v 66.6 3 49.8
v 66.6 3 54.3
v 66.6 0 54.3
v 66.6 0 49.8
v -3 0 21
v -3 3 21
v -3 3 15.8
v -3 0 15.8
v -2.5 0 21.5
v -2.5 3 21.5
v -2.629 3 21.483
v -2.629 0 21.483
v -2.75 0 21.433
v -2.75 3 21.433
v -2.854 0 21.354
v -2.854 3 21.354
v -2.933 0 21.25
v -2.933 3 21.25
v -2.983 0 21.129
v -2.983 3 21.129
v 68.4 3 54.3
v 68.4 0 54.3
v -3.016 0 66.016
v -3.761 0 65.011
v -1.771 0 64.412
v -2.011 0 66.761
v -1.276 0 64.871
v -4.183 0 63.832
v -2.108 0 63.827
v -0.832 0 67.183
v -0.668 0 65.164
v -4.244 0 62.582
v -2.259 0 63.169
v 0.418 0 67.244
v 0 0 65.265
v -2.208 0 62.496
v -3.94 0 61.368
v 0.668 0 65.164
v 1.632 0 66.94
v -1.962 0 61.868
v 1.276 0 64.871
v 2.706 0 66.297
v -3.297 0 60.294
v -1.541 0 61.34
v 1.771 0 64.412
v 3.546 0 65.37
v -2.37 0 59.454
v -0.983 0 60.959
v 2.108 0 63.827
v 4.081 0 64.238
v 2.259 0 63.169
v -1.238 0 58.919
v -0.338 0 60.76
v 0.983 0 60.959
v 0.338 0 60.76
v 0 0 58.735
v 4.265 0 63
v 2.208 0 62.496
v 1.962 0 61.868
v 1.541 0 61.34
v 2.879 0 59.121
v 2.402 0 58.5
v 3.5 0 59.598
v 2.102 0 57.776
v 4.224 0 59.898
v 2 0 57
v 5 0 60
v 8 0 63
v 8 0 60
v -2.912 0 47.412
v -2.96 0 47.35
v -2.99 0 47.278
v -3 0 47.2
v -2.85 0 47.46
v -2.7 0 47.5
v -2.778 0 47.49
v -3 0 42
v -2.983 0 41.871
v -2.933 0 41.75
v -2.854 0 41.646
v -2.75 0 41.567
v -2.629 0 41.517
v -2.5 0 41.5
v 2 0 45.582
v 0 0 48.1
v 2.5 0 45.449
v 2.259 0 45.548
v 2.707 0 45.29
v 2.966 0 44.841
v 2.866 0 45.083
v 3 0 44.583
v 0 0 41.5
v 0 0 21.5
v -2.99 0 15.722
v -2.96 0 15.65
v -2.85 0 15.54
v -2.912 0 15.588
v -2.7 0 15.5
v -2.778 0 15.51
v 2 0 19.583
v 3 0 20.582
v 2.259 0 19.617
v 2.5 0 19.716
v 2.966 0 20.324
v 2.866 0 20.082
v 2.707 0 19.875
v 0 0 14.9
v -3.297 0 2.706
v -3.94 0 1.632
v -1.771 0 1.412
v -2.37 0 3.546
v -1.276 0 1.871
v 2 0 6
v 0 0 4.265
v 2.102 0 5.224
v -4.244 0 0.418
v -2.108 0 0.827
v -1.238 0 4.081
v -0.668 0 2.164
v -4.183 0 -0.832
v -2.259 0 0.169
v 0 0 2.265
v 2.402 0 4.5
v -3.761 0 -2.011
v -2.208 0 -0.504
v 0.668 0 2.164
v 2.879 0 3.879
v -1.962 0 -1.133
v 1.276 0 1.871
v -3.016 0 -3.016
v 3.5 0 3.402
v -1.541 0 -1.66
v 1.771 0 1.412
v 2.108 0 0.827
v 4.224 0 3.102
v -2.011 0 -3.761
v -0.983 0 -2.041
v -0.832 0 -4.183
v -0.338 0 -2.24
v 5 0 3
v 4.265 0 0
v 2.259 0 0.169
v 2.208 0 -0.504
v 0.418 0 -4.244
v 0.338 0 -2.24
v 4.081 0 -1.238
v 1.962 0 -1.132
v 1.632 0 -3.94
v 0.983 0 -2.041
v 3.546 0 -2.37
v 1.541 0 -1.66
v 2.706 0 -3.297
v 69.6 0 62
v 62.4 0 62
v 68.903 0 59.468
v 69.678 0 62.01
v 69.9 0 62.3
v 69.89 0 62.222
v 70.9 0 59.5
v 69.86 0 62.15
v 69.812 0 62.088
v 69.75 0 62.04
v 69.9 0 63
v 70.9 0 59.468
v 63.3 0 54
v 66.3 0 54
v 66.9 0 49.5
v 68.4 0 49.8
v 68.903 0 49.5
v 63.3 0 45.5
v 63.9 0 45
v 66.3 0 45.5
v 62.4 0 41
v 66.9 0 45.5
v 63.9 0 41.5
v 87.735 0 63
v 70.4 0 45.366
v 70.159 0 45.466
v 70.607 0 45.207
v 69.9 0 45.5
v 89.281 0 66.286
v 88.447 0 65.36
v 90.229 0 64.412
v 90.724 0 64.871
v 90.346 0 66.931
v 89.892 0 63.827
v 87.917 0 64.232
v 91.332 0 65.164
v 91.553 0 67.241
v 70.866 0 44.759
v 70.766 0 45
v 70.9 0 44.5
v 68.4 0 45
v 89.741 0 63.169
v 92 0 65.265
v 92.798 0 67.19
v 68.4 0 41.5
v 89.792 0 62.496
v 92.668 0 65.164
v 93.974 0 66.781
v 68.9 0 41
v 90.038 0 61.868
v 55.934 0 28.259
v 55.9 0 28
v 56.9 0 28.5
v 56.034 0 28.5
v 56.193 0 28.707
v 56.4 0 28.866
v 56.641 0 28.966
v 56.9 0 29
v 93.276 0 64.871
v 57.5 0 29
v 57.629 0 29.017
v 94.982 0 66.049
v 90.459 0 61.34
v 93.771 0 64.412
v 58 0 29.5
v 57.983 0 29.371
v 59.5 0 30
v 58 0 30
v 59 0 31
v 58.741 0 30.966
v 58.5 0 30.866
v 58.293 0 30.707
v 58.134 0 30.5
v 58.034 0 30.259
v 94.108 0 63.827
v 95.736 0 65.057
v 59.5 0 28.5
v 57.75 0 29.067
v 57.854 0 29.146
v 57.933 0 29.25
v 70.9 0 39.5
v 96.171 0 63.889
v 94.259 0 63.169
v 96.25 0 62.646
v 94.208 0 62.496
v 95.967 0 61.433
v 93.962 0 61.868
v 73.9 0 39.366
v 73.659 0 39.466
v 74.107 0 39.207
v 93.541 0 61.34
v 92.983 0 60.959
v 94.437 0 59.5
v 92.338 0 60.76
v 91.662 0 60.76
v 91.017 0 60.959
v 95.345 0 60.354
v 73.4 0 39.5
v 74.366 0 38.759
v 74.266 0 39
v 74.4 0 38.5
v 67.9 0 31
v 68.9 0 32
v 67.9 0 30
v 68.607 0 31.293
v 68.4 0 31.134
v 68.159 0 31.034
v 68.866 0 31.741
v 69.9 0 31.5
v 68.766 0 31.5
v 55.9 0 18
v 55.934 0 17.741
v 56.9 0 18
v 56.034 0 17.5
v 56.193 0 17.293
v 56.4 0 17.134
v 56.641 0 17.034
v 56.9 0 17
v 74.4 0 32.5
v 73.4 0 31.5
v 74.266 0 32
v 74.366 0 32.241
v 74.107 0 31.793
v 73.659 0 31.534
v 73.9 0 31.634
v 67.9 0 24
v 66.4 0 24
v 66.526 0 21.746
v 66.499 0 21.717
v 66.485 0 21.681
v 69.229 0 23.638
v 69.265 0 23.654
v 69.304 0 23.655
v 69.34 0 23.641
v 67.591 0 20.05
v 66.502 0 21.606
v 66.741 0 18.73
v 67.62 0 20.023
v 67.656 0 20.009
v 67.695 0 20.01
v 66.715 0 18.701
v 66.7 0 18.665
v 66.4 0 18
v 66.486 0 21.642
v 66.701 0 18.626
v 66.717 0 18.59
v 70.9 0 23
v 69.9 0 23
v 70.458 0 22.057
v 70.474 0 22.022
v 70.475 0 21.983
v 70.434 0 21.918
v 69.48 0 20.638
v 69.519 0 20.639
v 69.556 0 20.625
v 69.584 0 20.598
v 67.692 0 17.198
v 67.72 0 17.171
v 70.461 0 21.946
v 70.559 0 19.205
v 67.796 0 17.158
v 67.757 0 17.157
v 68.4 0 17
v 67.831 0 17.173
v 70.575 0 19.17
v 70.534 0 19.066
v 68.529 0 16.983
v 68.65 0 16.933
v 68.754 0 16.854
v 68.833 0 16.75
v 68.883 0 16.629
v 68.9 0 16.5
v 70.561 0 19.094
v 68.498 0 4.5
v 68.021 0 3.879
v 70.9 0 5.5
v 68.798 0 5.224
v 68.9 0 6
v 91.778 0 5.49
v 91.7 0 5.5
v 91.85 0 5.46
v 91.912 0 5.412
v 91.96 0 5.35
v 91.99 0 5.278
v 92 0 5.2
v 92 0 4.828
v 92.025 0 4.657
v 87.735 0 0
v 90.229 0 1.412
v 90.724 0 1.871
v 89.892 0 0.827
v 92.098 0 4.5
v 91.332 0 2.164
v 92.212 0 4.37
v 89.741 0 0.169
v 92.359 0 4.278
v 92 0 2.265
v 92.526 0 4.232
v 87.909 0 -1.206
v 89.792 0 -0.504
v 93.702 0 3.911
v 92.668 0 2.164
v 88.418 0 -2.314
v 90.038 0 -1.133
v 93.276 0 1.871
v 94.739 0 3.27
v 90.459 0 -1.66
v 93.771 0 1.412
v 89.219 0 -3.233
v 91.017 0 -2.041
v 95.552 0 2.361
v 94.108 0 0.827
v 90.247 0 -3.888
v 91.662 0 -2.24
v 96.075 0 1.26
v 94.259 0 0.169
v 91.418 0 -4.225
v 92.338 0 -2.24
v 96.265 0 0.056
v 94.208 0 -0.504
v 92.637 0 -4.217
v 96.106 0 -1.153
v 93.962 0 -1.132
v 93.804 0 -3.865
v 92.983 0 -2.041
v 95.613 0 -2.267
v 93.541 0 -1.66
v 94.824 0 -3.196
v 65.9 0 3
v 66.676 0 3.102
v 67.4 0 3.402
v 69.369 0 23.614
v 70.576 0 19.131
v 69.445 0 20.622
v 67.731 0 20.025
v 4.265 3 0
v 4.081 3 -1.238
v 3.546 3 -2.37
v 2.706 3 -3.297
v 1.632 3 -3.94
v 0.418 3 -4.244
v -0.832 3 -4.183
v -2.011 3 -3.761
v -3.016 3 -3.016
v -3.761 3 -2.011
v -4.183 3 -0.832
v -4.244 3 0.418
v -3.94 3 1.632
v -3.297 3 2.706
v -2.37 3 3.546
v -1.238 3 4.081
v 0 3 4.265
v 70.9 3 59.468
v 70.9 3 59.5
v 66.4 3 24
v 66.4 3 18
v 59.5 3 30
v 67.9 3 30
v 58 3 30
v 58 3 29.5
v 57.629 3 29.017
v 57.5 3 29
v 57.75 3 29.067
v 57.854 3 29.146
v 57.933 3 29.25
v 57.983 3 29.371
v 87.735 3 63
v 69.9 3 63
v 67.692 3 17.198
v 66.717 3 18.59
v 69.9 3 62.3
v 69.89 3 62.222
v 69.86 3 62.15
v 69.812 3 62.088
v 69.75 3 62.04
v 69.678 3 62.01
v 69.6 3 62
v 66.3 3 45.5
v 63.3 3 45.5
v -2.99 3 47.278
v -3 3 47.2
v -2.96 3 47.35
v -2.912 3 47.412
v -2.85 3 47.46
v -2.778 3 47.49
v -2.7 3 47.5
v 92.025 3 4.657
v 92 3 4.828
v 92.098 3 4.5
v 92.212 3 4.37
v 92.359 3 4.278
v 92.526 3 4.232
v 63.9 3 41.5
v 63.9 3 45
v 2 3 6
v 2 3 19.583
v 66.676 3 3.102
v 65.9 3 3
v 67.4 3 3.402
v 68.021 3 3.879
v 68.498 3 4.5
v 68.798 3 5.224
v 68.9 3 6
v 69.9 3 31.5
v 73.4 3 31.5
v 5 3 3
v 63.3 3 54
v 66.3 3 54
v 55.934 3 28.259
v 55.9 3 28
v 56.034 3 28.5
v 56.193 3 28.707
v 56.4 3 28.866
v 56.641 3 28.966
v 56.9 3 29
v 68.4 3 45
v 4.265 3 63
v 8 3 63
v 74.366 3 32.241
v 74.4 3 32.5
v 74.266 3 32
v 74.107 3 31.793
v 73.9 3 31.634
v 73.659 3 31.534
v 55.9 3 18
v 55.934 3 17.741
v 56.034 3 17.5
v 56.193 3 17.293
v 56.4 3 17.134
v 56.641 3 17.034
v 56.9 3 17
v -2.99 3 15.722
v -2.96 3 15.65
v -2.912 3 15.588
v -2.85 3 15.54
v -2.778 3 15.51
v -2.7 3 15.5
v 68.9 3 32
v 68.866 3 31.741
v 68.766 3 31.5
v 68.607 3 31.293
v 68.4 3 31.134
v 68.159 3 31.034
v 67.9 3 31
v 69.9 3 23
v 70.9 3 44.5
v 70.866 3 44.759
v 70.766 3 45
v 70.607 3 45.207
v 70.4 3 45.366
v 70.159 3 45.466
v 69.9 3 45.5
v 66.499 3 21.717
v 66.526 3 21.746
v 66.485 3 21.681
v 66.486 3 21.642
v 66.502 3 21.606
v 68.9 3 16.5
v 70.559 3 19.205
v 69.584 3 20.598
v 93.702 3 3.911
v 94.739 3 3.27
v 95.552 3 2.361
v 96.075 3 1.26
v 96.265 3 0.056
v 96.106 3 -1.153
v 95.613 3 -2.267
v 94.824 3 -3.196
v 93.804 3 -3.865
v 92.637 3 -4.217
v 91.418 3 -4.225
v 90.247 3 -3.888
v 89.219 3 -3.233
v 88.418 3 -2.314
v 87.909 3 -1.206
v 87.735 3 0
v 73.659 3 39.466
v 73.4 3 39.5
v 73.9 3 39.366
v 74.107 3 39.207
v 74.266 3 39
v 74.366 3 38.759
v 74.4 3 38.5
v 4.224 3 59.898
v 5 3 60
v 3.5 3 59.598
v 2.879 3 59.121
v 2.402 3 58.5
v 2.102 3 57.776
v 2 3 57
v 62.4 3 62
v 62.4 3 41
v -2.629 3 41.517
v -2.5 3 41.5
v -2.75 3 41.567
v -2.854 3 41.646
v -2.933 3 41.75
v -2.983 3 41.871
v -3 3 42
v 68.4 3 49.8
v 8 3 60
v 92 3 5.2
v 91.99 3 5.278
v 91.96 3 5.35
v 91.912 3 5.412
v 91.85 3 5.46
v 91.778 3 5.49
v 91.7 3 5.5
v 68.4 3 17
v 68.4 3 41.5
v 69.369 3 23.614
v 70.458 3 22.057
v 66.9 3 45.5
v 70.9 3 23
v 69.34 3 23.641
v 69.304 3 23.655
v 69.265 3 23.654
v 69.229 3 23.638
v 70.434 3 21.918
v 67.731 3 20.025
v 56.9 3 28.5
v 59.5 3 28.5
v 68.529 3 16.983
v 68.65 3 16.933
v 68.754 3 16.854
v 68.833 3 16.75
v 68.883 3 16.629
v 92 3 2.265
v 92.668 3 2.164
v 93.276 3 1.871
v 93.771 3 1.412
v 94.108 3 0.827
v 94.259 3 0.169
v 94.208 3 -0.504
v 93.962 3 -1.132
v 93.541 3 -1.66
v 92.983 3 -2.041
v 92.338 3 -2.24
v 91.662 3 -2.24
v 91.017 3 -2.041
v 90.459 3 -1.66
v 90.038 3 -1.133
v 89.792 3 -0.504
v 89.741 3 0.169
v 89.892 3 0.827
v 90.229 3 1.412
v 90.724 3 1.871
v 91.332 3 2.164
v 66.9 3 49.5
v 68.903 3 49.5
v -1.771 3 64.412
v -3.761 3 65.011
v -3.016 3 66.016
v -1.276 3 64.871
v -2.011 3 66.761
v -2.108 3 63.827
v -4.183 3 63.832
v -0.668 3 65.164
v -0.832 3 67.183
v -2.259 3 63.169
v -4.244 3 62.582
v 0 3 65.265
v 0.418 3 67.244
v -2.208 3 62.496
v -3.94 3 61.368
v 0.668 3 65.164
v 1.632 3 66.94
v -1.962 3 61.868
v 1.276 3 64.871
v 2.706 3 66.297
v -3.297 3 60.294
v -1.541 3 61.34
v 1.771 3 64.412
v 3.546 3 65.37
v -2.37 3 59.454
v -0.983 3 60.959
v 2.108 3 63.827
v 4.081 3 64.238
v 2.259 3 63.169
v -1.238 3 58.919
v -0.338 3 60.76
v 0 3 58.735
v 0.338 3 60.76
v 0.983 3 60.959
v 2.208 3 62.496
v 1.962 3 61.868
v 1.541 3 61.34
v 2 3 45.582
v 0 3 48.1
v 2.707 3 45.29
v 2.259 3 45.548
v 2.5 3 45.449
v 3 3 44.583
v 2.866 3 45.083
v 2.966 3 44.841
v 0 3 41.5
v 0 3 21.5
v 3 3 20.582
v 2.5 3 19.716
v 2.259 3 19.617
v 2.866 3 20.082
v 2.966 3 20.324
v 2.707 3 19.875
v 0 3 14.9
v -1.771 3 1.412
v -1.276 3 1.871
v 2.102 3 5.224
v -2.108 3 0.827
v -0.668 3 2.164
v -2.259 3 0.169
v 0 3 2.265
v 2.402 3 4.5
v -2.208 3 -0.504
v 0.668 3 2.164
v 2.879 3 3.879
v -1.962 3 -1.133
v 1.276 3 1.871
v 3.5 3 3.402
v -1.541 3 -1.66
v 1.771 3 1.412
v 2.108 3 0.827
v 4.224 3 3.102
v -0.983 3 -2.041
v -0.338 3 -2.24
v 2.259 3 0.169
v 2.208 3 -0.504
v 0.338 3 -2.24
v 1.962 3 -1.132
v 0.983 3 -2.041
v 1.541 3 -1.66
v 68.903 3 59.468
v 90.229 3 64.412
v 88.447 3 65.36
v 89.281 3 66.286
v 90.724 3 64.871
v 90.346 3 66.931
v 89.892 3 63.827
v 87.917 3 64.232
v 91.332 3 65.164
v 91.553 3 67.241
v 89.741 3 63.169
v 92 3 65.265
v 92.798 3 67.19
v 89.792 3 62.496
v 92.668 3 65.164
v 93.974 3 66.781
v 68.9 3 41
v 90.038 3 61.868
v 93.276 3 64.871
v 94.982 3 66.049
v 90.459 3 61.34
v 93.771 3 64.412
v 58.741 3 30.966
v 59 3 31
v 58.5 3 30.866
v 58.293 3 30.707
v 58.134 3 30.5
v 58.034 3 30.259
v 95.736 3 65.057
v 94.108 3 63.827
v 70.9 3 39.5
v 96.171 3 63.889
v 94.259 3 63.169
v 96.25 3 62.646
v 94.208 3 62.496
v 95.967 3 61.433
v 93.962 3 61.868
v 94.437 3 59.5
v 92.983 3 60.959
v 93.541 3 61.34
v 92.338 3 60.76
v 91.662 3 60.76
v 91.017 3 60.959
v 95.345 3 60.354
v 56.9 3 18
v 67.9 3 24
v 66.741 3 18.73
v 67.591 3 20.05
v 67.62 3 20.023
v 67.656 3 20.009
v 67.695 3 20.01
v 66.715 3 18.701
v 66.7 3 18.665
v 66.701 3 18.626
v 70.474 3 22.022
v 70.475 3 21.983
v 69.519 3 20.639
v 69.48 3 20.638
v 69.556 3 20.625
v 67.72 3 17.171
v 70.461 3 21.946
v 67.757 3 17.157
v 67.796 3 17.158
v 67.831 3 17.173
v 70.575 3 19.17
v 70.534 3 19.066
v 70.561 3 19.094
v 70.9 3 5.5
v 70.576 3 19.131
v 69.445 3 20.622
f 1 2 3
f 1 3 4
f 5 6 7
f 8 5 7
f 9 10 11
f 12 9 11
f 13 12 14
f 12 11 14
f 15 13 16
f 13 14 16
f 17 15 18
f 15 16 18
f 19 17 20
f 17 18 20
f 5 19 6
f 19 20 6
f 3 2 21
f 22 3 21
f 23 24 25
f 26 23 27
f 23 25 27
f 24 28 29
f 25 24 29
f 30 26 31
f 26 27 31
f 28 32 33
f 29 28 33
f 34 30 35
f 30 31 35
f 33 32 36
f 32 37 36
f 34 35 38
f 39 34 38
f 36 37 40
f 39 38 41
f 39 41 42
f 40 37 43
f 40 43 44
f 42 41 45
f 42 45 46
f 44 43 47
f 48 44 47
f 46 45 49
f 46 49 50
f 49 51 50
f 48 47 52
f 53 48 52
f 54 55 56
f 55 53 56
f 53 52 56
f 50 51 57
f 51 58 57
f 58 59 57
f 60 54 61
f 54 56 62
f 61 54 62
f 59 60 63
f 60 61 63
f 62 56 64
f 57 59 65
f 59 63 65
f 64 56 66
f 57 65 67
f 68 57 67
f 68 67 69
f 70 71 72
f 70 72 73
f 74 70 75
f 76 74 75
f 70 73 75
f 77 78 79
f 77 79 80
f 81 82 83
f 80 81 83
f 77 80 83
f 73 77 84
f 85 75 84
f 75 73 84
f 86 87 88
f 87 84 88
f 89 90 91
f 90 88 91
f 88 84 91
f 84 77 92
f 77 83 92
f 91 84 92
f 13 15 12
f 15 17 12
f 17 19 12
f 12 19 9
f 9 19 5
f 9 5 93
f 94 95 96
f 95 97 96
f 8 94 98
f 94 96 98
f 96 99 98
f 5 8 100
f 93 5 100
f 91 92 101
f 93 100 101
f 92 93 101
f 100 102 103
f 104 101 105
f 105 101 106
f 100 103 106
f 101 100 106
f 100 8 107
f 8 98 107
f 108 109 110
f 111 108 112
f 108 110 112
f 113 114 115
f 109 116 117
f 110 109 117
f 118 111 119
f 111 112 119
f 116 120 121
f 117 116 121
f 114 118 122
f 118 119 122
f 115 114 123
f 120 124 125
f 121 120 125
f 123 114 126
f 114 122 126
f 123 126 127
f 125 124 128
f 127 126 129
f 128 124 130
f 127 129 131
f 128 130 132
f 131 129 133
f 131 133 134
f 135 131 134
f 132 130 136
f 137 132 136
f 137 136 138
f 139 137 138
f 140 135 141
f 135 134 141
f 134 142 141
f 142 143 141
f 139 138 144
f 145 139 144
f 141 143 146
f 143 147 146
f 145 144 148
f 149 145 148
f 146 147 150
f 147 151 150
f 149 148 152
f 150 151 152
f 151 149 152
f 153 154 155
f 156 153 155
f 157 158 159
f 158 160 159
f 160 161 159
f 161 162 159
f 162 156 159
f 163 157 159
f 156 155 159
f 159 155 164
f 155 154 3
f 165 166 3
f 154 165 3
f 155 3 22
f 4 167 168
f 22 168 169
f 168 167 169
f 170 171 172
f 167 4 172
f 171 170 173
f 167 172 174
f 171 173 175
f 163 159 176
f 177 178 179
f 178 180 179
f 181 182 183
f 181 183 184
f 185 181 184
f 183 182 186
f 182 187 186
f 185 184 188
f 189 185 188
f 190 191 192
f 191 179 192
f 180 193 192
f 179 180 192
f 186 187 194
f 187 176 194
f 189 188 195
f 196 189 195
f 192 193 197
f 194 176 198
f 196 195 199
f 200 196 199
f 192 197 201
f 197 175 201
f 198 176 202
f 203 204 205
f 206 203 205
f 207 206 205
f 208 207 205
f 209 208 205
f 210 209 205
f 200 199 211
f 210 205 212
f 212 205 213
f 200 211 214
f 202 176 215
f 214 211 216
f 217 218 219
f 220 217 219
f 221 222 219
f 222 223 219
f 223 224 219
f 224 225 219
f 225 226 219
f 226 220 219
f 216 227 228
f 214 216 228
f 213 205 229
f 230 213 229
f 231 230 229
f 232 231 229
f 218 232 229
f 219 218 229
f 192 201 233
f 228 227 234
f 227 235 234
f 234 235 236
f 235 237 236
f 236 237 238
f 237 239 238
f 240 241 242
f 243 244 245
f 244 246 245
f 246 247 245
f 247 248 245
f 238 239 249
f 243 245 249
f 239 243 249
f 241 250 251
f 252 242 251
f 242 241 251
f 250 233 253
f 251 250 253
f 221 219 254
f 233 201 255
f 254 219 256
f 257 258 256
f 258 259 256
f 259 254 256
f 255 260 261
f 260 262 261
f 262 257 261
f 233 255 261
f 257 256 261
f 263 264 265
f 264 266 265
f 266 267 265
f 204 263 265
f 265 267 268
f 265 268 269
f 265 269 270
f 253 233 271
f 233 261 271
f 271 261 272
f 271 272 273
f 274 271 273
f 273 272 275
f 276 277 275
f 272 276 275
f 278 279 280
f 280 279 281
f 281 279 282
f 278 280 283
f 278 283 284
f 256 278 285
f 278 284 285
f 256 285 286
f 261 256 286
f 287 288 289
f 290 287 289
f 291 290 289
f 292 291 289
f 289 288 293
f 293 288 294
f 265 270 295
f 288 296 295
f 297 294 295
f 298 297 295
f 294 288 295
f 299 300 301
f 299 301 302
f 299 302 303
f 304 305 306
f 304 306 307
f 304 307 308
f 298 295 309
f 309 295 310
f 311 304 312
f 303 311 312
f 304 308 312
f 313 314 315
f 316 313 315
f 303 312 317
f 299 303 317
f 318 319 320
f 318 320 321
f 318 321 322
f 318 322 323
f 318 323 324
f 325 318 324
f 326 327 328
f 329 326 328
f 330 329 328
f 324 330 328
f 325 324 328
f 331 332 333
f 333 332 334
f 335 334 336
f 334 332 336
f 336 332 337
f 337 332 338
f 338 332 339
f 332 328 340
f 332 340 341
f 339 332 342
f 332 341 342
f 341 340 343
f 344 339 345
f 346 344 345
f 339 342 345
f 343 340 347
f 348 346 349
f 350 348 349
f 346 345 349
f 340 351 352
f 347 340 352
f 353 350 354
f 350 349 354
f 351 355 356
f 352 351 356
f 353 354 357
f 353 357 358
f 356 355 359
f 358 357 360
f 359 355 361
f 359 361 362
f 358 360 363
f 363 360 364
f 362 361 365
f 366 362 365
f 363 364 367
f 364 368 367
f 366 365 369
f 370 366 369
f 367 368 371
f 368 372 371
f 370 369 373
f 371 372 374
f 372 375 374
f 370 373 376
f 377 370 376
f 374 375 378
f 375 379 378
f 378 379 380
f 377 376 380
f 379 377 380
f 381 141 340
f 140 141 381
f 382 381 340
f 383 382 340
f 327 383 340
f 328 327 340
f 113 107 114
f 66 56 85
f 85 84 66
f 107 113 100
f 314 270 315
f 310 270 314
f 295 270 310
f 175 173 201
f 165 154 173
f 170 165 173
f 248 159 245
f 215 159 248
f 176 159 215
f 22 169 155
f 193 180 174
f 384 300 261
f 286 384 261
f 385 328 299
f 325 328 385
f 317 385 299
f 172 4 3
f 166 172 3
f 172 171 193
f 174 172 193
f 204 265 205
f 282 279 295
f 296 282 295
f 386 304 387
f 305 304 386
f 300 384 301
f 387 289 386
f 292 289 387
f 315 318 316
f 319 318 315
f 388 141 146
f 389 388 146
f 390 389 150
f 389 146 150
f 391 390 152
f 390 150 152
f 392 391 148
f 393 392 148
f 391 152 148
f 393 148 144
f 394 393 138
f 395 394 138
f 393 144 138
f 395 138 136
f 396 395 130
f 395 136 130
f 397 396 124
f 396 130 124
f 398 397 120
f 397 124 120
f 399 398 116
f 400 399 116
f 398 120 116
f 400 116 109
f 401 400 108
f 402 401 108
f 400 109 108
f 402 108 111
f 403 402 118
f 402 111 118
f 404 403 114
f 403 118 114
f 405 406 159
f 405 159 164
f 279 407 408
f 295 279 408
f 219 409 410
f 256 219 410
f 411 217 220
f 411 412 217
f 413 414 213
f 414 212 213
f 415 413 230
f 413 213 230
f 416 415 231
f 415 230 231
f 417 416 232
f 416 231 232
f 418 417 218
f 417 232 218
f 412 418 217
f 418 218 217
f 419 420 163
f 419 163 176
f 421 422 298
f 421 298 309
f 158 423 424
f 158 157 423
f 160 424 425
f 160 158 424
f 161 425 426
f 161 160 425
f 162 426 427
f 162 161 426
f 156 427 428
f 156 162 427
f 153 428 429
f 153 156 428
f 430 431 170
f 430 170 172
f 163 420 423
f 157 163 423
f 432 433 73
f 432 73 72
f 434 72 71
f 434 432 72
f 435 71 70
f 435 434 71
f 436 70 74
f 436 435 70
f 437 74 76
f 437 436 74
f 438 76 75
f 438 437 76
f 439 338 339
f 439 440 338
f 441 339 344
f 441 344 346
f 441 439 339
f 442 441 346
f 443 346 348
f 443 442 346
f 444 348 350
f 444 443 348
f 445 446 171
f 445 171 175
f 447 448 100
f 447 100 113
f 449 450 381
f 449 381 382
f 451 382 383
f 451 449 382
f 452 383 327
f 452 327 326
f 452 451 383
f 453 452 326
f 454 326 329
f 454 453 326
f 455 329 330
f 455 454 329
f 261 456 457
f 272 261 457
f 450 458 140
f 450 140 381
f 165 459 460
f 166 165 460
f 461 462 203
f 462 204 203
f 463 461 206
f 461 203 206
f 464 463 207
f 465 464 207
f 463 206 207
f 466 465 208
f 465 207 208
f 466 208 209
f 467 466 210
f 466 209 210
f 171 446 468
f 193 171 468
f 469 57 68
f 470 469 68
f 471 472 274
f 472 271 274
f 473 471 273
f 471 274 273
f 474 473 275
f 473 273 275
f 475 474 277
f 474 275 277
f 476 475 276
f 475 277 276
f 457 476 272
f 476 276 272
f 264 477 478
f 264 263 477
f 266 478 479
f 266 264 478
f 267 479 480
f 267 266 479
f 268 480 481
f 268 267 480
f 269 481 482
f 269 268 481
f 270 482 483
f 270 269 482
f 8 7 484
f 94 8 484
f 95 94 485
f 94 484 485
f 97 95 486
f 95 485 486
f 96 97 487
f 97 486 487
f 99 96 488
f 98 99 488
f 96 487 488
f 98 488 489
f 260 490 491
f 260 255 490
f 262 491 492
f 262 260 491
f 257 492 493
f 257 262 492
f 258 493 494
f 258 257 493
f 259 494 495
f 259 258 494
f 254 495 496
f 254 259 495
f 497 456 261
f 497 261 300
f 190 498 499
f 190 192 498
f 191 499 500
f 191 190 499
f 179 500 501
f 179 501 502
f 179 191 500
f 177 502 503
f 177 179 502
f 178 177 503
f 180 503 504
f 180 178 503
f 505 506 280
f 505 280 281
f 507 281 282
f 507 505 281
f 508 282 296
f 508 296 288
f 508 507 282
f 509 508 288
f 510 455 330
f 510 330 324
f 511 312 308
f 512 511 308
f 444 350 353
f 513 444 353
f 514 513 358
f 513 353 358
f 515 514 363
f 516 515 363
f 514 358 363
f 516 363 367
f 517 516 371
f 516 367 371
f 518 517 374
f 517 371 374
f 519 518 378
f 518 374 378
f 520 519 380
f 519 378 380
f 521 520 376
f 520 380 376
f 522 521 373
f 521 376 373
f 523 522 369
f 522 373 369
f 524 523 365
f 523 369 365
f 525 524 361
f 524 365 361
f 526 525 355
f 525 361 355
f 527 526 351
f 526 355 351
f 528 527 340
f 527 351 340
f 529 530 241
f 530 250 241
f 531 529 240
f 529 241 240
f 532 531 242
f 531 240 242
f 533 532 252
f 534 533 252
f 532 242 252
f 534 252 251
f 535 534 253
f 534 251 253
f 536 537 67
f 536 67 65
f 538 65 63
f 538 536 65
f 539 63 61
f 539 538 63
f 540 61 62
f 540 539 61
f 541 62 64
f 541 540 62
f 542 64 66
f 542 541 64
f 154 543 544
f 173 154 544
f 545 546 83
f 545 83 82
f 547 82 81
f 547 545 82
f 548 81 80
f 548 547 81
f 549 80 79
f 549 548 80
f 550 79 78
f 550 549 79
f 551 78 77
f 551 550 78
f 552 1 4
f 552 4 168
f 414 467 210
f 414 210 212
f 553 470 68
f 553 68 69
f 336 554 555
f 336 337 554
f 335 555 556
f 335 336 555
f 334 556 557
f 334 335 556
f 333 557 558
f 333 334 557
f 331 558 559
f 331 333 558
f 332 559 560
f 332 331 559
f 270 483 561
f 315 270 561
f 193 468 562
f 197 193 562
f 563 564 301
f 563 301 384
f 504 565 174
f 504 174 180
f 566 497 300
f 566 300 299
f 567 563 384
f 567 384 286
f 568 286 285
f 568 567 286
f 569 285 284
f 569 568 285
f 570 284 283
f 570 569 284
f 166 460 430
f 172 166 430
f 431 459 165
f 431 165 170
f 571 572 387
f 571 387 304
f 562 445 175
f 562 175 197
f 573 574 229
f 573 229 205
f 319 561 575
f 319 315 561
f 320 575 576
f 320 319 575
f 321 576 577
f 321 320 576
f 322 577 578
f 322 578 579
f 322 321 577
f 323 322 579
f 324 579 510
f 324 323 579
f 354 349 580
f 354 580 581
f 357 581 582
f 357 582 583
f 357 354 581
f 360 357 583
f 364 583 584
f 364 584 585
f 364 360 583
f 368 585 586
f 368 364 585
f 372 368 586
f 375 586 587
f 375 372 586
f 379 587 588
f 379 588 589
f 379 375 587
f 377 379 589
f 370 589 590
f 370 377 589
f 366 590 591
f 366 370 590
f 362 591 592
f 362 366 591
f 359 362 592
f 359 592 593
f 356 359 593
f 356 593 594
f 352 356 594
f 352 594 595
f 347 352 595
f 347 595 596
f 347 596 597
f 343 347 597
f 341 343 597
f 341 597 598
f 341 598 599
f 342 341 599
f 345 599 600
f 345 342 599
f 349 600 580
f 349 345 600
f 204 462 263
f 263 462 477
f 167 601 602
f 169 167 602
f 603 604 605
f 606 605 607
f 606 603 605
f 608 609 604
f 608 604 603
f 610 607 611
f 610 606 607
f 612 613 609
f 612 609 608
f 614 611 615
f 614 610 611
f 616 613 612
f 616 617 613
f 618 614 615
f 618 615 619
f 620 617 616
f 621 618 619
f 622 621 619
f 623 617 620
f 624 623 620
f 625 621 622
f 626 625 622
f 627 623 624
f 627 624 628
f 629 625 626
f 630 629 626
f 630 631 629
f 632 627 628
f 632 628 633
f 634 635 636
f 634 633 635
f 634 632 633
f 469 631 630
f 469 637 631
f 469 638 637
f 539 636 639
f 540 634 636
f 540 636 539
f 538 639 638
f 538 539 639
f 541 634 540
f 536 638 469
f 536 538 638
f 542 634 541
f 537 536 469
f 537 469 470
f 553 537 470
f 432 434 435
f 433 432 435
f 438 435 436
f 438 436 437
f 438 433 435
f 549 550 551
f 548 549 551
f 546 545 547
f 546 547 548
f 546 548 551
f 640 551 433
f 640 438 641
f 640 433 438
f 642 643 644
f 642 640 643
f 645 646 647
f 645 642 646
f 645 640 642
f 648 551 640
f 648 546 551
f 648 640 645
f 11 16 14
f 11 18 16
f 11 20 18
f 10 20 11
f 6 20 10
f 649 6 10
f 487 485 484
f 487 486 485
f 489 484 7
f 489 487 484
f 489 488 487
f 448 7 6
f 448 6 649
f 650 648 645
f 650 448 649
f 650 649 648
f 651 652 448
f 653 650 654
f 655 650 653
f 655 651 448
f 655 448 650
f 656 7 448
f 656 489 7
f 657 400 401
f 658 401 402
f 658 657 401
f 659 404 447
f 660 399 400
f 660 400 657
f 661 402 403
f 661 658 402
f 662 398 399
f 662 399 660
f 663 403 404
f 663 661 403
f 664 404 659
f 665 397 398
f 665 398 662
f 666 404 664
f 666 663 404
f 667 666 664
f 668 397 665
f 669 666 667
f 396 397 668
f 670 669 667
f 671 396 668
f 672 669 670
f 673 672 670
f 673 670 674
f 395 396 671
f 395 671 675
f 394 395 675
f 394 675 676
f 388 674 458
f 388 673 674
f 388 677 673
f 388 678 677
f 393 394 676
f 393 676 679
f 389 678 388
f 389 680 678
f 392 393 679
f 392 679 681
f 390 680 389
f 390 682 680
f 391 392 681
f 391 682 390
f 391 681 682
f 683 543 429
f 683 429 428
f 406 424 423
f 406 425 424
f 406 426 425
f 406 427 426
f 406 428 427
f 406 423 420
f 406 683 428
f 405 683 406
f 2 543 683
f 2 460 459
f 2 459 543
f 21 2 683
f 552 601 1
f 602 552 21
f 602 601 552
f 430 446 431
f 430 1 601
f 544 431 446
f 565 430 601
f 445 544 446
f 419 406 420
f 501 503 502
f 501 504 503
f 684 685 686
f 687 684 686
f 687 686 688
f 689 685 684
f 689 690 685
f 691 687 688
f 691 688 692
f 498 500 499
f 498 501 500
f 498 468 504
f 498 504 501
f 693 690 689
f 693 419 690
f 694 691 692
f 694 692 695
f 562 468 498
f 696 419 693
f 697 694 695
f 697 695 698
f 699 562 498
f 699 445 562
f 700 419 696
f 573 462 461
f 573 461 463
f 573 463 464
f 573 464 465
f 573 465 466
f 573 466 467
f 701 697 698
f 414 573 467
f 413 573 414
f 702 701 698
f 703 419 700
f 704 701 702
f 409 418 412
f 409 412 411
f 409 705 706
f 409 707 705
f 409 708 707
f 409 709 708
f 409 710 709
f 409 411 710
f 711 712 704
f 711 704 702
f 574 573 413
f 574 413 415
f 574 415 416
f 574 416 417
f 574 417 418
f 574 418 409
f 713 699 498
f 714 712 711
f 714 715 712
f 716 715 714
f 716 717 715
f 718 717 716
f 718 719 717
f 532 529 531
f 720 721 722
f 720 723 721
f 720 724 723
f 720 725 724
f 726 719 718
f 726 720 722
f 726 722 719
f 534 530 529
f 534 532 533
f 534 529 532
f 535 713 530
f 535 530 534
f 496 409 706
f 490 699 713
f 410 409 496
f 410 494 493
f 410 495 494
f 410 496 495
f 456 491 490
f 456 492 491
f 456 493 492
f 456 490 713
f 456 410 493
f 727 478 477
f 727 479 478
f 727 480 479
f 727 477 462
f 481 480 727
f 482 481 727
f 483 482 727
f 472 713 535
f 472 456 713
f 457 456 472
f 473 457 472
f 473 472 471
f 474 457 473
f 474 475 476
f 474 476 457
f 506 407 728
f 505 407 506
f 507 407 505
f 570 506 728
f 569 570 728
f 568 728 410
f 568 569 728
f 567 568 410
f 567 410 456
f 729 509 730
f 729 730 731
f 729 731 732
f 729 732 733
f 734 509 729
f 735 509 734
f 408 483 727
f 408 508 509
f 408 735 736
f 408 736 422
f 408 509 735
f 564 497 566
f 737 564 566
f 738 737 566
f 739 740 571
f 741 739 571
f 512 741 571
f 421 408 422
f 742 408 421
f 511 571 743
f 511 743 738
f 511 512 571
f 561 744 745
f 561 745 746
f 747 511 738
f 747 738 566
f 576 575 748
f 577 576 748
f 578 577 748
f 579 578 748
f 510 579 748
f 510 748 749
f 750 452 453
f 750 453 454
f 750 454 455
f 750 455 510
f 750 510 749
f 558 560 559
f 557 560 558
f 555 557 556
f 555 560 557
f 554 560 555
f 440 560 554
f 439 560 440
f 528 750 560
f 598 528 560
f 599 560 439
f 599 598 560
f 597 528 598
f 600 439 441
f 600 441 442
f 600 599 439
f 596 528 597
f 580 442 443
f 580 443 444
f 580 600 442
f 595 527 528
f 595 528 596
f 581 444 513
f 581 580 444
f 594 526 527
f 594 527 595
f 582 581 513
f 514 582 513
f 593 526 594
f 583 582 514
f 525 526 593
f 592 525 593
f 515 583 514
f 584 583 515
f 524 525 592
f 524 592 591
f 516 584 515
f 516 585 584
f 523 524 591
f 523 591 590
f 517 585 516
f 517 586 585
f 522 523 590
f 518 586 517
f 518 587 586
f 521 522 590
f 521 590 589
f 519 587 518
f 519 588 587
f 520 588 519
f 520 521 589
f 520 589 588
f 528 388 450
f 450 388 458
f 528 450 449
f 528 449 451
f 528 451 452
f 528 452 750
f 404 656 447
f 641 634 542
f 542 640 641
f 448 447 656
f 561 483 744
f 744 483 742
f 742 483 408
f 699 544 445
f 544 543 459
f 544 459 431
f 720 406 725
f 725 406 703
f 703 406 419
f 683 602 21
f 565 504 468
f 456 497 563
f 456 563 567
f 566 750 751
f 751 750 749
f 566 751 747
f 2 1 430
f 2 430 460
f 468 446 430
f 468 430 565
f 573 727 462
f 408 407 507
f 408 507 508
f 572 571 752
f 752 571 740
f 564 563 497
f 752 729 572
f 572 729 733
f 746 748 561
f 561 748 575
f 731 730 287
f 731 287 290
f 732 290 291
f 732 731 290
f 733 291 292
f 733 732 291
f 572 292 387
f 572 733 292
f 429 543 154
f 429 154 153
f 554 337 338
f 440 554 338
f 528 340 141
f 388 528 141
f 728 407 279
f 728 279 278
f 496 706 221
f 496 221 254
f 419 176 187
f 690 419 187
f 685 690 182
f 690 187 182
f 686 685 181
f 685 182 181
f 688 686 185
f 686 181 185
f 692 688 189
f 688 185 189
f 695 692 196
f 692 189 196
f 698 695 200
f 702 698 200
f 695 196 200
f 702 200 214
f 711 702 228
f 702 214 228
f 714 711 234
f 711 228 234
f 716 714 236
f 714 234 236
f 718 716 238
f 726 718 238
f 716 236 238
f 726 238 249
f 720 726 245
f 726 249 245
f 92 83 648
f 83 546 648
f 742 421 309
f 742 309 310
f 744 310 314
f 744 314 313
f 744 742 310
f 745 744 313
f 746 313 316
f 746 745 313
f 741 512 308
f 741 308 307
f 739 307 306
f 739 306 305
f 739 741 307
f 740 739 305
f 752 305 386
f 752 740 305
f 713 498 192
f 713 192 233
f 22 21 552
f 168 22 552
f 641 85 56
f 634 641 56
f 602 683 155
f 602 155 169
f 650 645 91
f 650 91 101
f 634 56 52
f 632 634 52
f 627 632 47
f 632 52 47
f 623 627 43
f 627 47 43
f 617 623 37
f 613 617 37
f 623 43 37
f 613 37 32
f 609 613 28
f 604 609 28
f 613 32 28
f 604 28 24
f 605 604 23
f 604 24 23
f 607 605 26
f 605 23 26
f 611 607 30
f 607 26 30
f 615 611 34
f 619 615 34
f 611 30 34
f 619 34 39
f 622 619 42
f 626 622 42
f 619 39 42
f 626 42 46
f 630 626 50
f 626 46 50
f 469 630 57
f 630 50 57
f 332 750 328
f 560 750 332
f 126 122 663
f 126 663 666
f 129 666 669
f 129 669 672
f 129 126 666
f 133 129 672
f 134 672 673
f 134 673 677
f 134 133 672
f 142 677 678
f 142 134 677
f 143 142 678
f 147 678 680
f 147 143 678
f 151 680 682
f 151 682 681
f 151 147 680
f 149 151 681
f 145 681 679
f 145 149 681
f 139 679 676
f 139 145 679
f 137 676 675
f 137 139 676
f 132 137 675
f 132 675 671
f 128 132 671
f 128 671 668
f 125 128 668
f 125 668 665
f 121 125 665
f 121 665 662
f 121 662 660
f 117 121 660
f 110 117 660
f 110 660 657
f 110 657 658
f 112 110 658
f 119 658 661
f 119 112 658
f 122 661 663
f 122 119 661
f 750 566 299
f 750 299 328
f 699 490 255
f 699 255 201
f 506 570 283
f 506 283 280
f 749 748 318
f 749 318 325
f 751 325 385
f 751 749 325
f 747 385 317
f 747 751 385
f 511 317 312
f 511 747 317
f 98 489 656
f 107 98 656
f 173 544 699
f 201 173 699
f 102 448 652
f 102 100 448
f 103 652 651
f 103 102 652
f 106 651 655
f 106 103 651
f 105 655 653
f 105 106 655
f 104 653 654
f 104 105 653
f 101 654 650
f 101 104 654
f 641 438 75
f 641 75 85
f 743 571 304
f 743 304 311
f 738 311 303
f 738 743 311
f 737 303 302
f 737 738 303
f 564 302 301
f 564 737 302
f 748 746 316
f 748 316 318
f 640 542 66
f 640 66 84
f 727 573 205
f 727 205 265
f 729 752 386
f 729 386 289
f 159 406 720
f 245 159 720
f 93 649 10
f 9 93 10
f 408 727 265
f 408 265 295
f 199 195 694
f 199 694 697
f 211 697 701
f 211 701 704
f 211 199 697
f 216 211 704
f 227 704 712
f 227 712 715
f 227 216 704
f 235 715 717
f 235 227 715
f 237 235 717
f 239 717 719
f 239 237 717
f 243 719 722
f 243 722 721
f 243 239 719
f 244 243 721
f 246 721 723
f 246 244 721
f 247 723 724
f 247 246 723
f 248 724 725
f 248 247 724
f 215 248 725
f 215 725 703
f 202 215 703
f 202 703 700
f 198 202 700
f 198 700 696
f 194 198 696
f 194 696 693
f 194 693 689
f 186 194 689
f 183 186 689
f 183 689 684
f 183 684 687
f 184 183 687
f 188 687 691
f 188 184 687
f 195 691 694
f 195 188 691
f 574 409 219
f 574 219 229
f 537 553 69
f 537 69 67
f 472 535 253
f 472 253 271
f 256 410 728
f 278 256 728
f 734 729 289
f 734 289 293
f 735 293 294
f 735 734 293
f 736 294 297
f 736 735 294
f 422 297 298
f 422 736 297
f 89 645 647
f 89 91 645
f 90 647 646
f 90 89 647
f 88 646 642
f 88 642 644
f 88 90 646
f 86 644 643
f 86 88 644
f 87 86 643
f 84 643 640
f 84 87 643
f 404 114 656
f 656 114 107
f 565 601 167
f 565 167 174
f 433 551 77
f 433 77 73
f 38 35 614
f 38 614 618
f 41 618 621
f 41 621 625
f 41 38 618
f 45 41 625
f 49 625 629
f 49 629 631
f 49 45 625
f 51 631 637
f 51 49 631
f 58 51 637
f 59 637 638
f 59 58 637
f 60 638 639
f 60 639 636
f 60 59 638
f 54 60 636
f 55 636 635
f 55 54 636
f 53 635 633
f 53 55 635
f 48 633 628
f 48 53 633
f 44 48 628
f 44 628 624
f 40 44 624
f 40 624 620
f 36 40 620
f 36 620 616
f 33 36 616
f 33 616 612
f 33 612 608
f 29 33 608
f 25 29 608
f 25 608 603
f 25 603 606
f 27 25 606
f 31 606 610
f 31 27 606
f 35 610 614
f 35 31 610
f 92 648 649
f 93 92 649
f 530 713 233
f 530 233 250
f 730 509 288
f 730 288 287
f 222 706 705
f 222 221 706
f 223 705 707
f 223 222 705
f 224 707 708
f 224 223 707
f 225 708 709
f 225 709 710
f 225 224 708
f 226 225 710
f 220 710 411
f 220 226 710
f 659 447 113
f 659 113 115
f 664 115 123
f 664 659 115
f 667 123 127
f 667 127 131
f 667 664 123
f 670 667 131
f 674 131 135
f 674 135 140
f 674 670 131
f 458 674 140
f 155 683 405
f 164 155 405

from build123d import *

# Parameters (mm, degrees)
SKETCH1_R            = 2.265
BOSS_EXTRUDE1_DEPTH  = 3
SKETCH2_W            = 6.5
SKETCH2_H            = 20
CUT_EXTRUDE1_DEPTH   = 3
BOSS_EXTRUDE2_DEPTH  = 3
CUT_EXTRUDE2_DEPTH   = 3
SKETCH5_W            = 3
SKETCH5_H            = 26
BOSS_EXTRUDE6_DEPTH  = 3
FILLET1_R            = 1
SKETCH9_W            = 57
SKETCH9_H            = 3
CUT_EXTRUDE4_DEPTH   = 3
SKETCH11_W           = 21.1
SKETCH11_H           = 54
CUT_EXTRUDE6_DEPTH   = 3
SKETCH12_W           = 5.606838984
SKETCH12_H           = 3.16637745
CUT_EXTRUDE7_DEPTH   = 3
SKETCH14_W           = 13
SKETCH14_H           = 14
SKETCH14_W_2         = 11
SKETCH14_H_2         = 12
BOSS_EXTRUDE9_DEPTH  = 3
SKETCH15_W           = 1
SKETCH15_H           = 8.5
CUT_EXTRUDE8_DEPTH   = 3
SKETCH16_W           = 3.5
SKETCH16_H           = 8
BOSS_EXTRUDE10_DEPTH = 3
SKETCH17_W           = 1.5
SKETCH17_H           = 6
BOSS_EXTRUDE11_DEPTH = 3
CUT_EXTRUDE9_DEPTH   = 3
SKETCH19_W           = 2.1
SKETCH19_H           = 2
CUT_EXTRUDE10_DEPTH  = 3
BOSS_EXTRUDE16_DEPTH = 3
FILLET2_R            = 1
FILLET3_R            = 0.5
FILLET4_R            = 0.5
FILLET6_R            = 1
SKETCH21_W           = 8
SKETCH21_H           = 22
BOSS_EXTRUDE13_DEPTH = 3
SKETCH24_W           = 4
SKETCH24_H           = 6.433647318
CUT_EXTRUDE12_DEPTH  = 3
FILLET9_R            = 1
SKETCH25_W           = 4.5
SKETCH25_H           = 3.5
SKETCH25_W_2         = 4
SKETCH25_H_2         = 4
CUT_EXTRUDE14_DEPTH  = 3
SKETCH26_W           = 4
SKETCH26_H           = 2.433647318
BOSS_EXTRUDE15_DEPTH = 3
SKETCH27_W           = 3
SKETCH27_H           = 8.5
CUT_EXTRUDE15_DEPTH  = 3
SKETCH28_W           = 1.8
SKETCH28_H           = 4.5
CUT_EXTRUDE16_DEPTH  = 3
SKETCH29_W           = 1.997350186
SKETCH29_H           = 9.968253882
CUT_EXTRUDE17_DEPTH  = 3
SKETCH30_W           = 7.5
SKETCH30_H           = 1
CUT_EXTRUDE18_DEPTH  = 3
FILLET11_R           = 0.3
FILLET12_R           = 0.6
FILLET13_R           = 0.3


with BuildPart() as part:
    # Sketch1 → Boss-Extrude1 (new body)
    with BuildSketch(Plane(origin=(0, 0, 0), x_dir=(1, 0, 0), z_dir=(0, 1, 0))):
        with BuildLine():
            Line((0, -4.265), (0, -58.735))
            ThreePointArc((0, -58.735), (-3.015810422, -66.015810422), (4.265, -63))
            Line((4.265, -63), (87.735, -63))
            ThreePointArc((87.735, -63), (95.015810422, -66.015810422), (92, -58.735))
            Line((92, -58.735), (92, -4.265))
            ThreePointArc((92, -4.265), (95.015810422, 3.015810422), (87.735, 0))
            Line((87.735, 0), (4.265, 0))
            ThreePointArc((4.265, 0), (-3.015810422, 3.015810422), (0, -4.265))
        make_face()
        with Locations(Location((0, 0, 0), (0, 0, 270))):
            Circle(SKETCH1_R, mode=Mode.SUBTRACT)
        with Locations(Location((92, 0, 0), (0, 0, 270))):
            Circle(SKETCH1_R, mode=Mode.SUBTRACT)
        with Locations(Location((92, -63, 0), (0, 0, 270))):
            Circle(SKETCH1_R, mode=Mode.SUBTRACT)
        with Locations(Location((0, -63, 0), (0, 0, 270))):
            Circle(SKETCH1_R, mode=Mode.SUBTRACT)
    extrude(amount=BOSS_EXTRUDE1_DEPTH)

    # Sketch2 → Cut-Extrude1 (cut)
    with BuildSketch(Plane(origin=(0, 3, 0), x_dir=(1, 0, 0), z_dir=(0, 1, 0))):
        with Locations((3.25, -31.5)):
            Rectangle(SKETCH2_W, SKETCH2_H)
    extrude(amount=-CUT_EXTRUDE1_DEPTH, mode=Mode.SUBTRACT)

    # Sketch3 → Boss-Extrude2 (add)
    with BuildSketch(Plane(origin=(0, 3, 0), x_dir=(1, 0, 0), z_dir=(0, 1, 0))):
        with BuildLine():
            Line((-2.7, -15.5), (0, -14.9))
            Line((0, -14.9), (0, -21.5))
            Line((0, -21.5), (-2.5, -21.5))
            ThreePointArc((-2.5, -21.5), (-2.853553391, -21.353553391), (-3, -21))
            Line((-3, -21), (-3, -15.8))
            ThreePointArc((-3, -15.8), (-2.912132034, -15.587867966), (-2.7, -15.5))
        make_face()
        with BuildLine():
            Line((-3, -42), (-3, -47.2))
            ThreePointArc((-3, -47.2), (-2.912132034, -47.412132034), (-2.7, -47.5))
            Line((-2.7, -47.5), (0, -48.1))
            Line((0, -48.1), (0, -41.5))
            Line((0, -41.5), (-2.5, -41.5))
            ThreePointArc((-2.5, -41.5), (-2.853553391, -41.646446609), (-3, -42))
        make_face()
    extrude(amount=-BOSS_EXTRUDE2_DEPTH)

    # Sketch6 → Cut-Extrude2 (cut)
    with BuildSketch(Plane(origin=(0, 3, 0), x_dir=(1, 0, 0), z_dir=(0, 1, 0))):
        with BuildLine():
            Line((5, -3), (65.9, -3))
            ThreePointArc((65.9, -3), (68.021320344, -3.878679656), (68.9, -6))
            Line((68.9, -6), (68.9, -57))
            ThreePointArc((68.9, -57), (68.021320344, -59.121320344), (65.9, -60))
            Line((65.9, -60), (5, -60))
            ThreePointArc((5, -60), (2.878679656, -59.121320344), (2, -57))
            Line((2, -57), (2, -6))
            ThreePointArc((2, -6), (2.878679656, -3.878679656), (5, -3))
        make_face()
    extrude(amount=-CUT_EXTRUDE2_DEPTH, mode=Mode.SUBTRACT)

    # Sketch5 → Boss-Extrude6 (add)
    with BuildSketch(Plane(origin=(0, 3, 0), x_dir=(1, 0, 0), z_dir=(0, 1, 0))):
        with Locations((1.5, -32.5825)):
            Rectangle(SKETCH5_W, SKETCH5_H)
    extrude(amount=-BOSS_EXTRUDE6_DEPTH)

    # Fillet1
    fillet1_edges = [part.edges().sort_by_distance(p)[0] for p in [
        (3, 1.5, 45.5825),
        (3, 1.5, 19.5825),
    ]]
    fillet(fillet1_edges, radius=FILLET1_R - 0.0001)  # a hair under: the kernel refuses the full size

    # Sketch9 → Cut-Extrude4 (cut)
    with BuildSketch(Plane(origin=(0, 3, 0), x_dir=(1, 0, 0), z_dir=(0, 1, 0))):
        with Locations((36.5, -61.5)):
            Rectangle(SKETCH9_W, SKETCH9_H)
    extrude(amount=-CUT_EXTRUDE4_DEPTH, mode=Mode.SUBTRACT)

    # Sketch11 → Cut-Extrude6 (cut)
    with BuildSketch(Plane(origin=(0, 3, 0), x_dir=(1, 0, 0), z_dir=(0, 1, 0))):
        with Locations((81.45, -32.5)):
            Rectangle(SKETCH11_W, SKETCH11_H)
    extrude(amount=-CUT_EXTRUDE6_DEPTH, mode=Mode.SUBTRACT)

    # Sketch12 → Cut-Extrude7 (cut)
    with BuildSketch(Plane(origin=(0, 3, 0), x_dir=(1, 0, 0), z_dir=(0, 1, 0))):
        with Locations((94.803419492, -57.916811275)):
            Rectangle(SKETCH12_W, SKETCH12_H)
    extrude(amount=-CUT_EXTRUDE7_DEPTH, mode=Mode.SUBTRACT)

    # Sketch14 → Boss-Extrude9 (add)
    with BuildSketch(Plane(origin=(0, 3, 0), x_dir=(1, 0, 0), z_dir=(0, 1, 0))):
        with Locations((62.4, -24)):
            Rectangle(SKETCH14_W, SKETCH14_H)
        with Locations((62.4, -24)):
            Rectangle(SKETCH14_W_2, SKETCH14_H_2, mode=Mode.SUBTRACT)
    extrude(amount=-BOSS_EXTRUDE9_DEPTH)

    # Sketch15 → Cut-Extrude8 (cut)
    with BuildSketch(Plane(origin=(0, 3, 0), x_dir=(1, 0, 0), z_dir=(0, 1, 0))):
        with Locations((70.4, -27.25)):
            Rectangle(SKETCH15_W, SKETCH15_H)
    extrude(amount=-CUT_EXTRUDE8_DEPTH, mode=Mode.SUBTRACT)

    # Sketch16 → Boss-Extrude10 (add)
    with BuildSketch(Plane(origin=(0, 3, 0), x_dir=(1, 0, 0), z_dir=(0, 1, 0))):
        with Locations((72.65, -35.5)):
            Rectangle(SKETCH16_W, SKETCH16_H)
    extrude(amount=-BOSS_EXTRUDE10_DEPTH)

    # Sketch17 → Boss-Extrude11 (add)
    with BuildSketch(Plane(origin=(0, 3, 0), x_dir=(1, 0, 0), z_dir=(0, 1, 0))):
        with Locations((67.15, -21)):
            Rectangle(SKETCH17_W, SKETCH17_H)
    extrude(amount=-BOSS_EXTRUDE11_DEPTH)

    # Sketch18 → Cut-Extrude9 (cut)
    with BuildSketch(Plane(origin=(0, 3, 0), x_dir=(1, 0, 0), z_dir=(0, 1, 0))):
        with BuildLine():
            Line((66.716936581, -18.590391311), (67.692016523, -17.197832836))
            ThreePointArc((67.692016523, -17.197832836), (67.75656691, -17.156709704), (67.831289371, -17.173275275))
            Line((67.831289371, -17.173275275), (70.534491117, -19.066077515))
            ThreePointArc((70.534491117, -19.066077515), (70.575614249, -19.130627902), (70.559048678, -19.205350363))
            Line((70.559048678, -19.205350363), (69.583968736, -20.597908838))
            ThreePointArc((69.583968736, -20.597908838), (69.51941835, -20.63903197), (69.444695888, -20.622466399))
            Line((69.444695888, -20.622466399), (66.741494142, -18.729664159))
            ThreePointArc((66.741494142, -18.729664159), (66.70037101, -18.665113772), (66.716936581, -18.590391311))
        make_face()
        with BuildLine():
            Line((66.501627394, -21.606320712), (67.591422623, -20.049931828))
            ThreePointArc((67.591422623, -20.049931828), (67.65597301, -20.008808696), (67.730695471, -20.025374267))
            Line((67.730695471, -20.025374267), (70.433897217, -21.918176507))
            ThreePointArc((70.433897217, -21.918176507), (70.475020349, -21.982726894), (70.458454778, -22.057449355))
            Line((70.458454778, -22.057449355), (69.368659549, -23.613838239))
            ThreePointArc((69.368659549, -23.613838239), (69.304109162, -23.654961371), (69.229386701, -23.6383958))
            Line((69.229386701, -23.6383958), (66.526184955, -21.74559356))
            ThreePointArc((66.526184955, -21.74559356), (66.485061823, -21.681043173), (66.501627394, -21.606320712))
        make_face()
    extrude(amount=-CUT_EXTRUDE9_DEPTH, mode=Mode.SUBTRACT)

    # Sketch19 → Cut-Extrude10 (cut)
    with BuildSketch(Plane(origin=(0, 3, 0), x_dir=(1, 0, 0), z_dir=(0, 1, 0))):
        with Locations((56.95, -30)):
            Rectangle(SKETCH19_W, SKETCH19_H)
    extrude(amount=-CUT_EXTRUDE10_DEPTH, mode=Mode.SUBTRACT)

    # Sketch31 → Boss-Extrude16 (add)
    with BuildSketch(Plane(origin=(0, 3, 0), x_dir=(1, 0, 0), z_dir=(0, 1, 0))):
        Polygon((58, -30), (59.5, -30), (59.5, -28.5), (58, -28.5), (56.9, -28.5), (56.9, -29), (58, -29), align=None)
    extrude(amount=-BOSS_EXTRUDE16_DEPTH)

    # Fillet2
    fillet2_edges = [part.edges().sort_by_distance(p)[0] for p in [
        (68.9, 1.5, 31),
        (55.9, 1.5, 17),
        (55.9, 1.5, 29),
        (58, 1.5, 31),
    ]]
    fillet(fillet2_edges, radius=FILLET2_R)

    # Fillet3
    fillet3_edges = [part.edges().sort_by_distance(p)[0] for p in [
        (68.9, 1.5, 17),
    ]]
    fillet(fillet3_edges, radius=FILLET3_R)

    # Fillet4
    fillet4_edges = [part.edges().sort_by_distance(p)[0] for p in [
        (58, 1.5, 29),
    ]]
    fillet(fillet4_edges, radius=FILLET4_R)

    # Fillet6
    fillet6_edges = [part.edges().sort_by_distance(p)[0] for p in [
        (74.4, 1.5, 31.5),
        (74.4, 1.5, 39.5),
    ]]
    fillet(fillet6_edges, radius=FILLET6_R)

    # Sketch21 → Boss-Extrude13 (add)
    with BuildSketch(Plane(origin=(0, 3, 0), x_dir=(1, 0, 0), z_dir=(0, 1, 0))):
        with Locations((66.4, -52)):
            Rectangle(SKETCH21_W, SKETCH21_H)
    extrude(amount=-BOSS_EXTRUDE13_DEPTH)

    # Sketch24 → Cut-Extrude12 (cut)
    with BuildSketch(Plane(origin=(0, 3, 0), x_dir=(1, 0, 0), z_dir=(0, 1, 0))):
        with Locations((70.14, -48.716823659)):
            Rectangle(SKETCH24_W, SKETCH24_H)
    extrude(amount=-CUT_EXTRUDE12_DEPTH, mode=Mode.SUBTRACT)

    # Fillet9
    fillet9_edges = [part.edges().sort_by_distance(p)[0] for p in [
        (70.9, 1.5, 45.5),
    ]]
    fillet(fillet9_edges, radius=FILLET9_R)

    # Sketch25 → Cut-Extrude14 (cut)
    with BuildSketch(Plane(origin=(0, 3, 0), x_dir=(1, 0, 0), z_dir=(0, 1, 0))):
        with Locations((66.15, -43.25)):
            Rectangle(SKETCH25_W, SKETCH25_H)
        with Locations((68.9, -47.5)):
            Rectangle(SKETCH25_W_2, SKETCH25_H_2)
    extrude(amount=-CUT_EXTRUDE14_DEPTH, mode=Mode.SUBTRACT)

    # Sketch26 → Boss-Extrude15 (add)
    with BuildSketch(Plane(origin=(0, 3, 0), x_dir=(1, 0, 0), z_dir=(0, 1, 0))):
        with Locations((68.9, -50.716823659)):
            Rectangle(SKETCH26_W, SKETCH26_H)
    extrude(amount=-BOSS_EXTRUDE15_DEPTH)

    # Sketch27 → Cut-Extrude15 (cut)
    with BuildSketch(Plane(origin=(0, 3, 0), x_dir=(1, 0, 0), z_dir=(0, 1, 0))):
        with Locations((64.8, -49.75)):
            Rectangle(SKETCH27_W, SKETCH27_H)
    extrude(amount=-CUT_EXTRUDE15_DEPTH, mode=Mode.SUBTRACT)

    # Sketch28 → Cut-Extrude16 (cut)
    with BuildSketch(Plane(origin=(0, 3, 0), x_dir=(1, 0, 0), z_dir=(0, 1, 0))):
        with Locations((67.5, -52.05)):
            Rectangle(SKETCH28_W, SKETCH28_H)
    extrude(amount=-CUT_EXTRUDE16_DEPTH, mode=Mode.SUBTRACT)

    # Sketch29 → Cut-Extrude17 (cut)
    with BuildSketch(Plane(origin=(0, 3, 0), x_dir=(1, 0, 0), z_dir=(0, 1, 0))):
        with Locations((69.901324907, -54.484126941)):
            Rectangle(SKETCH29_W, SKETCH29_H)
    extrude(amount=-CUT_EXTRUDE17_DEPTH, mode=Mode.SUBTRACT)

    # Sketch30 → Cut-Extrude18 (cut)
    with BuildSketch(Plane(origin=(0, 3, 0), x_dir=(1, 0, 0), z_dir=(0, 1, 0))):
        with Locations((66.15, -62.5)):
            Rectangle(SKETCH30_W, SKETCH30_H)
    extrude(amount=-CUT_EXTRUDE18_DEPTH, mode=Mode.SUBTRACT)

    # Fillet11
    fillet11_edges = [part.edges().sort_by_distance(p)[0] for p in [
        (69.9, 1.5, 62),
    ]]
    fillet(fillet11_edges, radius=FILLET11_R)

    # Fillet12
    fillet12_edges = [part.edges().sort_by_distance(p)[0] for p in [
        (92, 1.5, 4.265),
    ]]
    fillet(fillet12_edges, radius=FILLET12_R)

    # Fillet13
    fillet13_edges = [part.edges().sort_by_distance(p)[0] for p in [
        (92, 1.5, 5.5),
    ]]
    fillet(fillet13_edges, radius=FILLET13_R)


solid = part.part
